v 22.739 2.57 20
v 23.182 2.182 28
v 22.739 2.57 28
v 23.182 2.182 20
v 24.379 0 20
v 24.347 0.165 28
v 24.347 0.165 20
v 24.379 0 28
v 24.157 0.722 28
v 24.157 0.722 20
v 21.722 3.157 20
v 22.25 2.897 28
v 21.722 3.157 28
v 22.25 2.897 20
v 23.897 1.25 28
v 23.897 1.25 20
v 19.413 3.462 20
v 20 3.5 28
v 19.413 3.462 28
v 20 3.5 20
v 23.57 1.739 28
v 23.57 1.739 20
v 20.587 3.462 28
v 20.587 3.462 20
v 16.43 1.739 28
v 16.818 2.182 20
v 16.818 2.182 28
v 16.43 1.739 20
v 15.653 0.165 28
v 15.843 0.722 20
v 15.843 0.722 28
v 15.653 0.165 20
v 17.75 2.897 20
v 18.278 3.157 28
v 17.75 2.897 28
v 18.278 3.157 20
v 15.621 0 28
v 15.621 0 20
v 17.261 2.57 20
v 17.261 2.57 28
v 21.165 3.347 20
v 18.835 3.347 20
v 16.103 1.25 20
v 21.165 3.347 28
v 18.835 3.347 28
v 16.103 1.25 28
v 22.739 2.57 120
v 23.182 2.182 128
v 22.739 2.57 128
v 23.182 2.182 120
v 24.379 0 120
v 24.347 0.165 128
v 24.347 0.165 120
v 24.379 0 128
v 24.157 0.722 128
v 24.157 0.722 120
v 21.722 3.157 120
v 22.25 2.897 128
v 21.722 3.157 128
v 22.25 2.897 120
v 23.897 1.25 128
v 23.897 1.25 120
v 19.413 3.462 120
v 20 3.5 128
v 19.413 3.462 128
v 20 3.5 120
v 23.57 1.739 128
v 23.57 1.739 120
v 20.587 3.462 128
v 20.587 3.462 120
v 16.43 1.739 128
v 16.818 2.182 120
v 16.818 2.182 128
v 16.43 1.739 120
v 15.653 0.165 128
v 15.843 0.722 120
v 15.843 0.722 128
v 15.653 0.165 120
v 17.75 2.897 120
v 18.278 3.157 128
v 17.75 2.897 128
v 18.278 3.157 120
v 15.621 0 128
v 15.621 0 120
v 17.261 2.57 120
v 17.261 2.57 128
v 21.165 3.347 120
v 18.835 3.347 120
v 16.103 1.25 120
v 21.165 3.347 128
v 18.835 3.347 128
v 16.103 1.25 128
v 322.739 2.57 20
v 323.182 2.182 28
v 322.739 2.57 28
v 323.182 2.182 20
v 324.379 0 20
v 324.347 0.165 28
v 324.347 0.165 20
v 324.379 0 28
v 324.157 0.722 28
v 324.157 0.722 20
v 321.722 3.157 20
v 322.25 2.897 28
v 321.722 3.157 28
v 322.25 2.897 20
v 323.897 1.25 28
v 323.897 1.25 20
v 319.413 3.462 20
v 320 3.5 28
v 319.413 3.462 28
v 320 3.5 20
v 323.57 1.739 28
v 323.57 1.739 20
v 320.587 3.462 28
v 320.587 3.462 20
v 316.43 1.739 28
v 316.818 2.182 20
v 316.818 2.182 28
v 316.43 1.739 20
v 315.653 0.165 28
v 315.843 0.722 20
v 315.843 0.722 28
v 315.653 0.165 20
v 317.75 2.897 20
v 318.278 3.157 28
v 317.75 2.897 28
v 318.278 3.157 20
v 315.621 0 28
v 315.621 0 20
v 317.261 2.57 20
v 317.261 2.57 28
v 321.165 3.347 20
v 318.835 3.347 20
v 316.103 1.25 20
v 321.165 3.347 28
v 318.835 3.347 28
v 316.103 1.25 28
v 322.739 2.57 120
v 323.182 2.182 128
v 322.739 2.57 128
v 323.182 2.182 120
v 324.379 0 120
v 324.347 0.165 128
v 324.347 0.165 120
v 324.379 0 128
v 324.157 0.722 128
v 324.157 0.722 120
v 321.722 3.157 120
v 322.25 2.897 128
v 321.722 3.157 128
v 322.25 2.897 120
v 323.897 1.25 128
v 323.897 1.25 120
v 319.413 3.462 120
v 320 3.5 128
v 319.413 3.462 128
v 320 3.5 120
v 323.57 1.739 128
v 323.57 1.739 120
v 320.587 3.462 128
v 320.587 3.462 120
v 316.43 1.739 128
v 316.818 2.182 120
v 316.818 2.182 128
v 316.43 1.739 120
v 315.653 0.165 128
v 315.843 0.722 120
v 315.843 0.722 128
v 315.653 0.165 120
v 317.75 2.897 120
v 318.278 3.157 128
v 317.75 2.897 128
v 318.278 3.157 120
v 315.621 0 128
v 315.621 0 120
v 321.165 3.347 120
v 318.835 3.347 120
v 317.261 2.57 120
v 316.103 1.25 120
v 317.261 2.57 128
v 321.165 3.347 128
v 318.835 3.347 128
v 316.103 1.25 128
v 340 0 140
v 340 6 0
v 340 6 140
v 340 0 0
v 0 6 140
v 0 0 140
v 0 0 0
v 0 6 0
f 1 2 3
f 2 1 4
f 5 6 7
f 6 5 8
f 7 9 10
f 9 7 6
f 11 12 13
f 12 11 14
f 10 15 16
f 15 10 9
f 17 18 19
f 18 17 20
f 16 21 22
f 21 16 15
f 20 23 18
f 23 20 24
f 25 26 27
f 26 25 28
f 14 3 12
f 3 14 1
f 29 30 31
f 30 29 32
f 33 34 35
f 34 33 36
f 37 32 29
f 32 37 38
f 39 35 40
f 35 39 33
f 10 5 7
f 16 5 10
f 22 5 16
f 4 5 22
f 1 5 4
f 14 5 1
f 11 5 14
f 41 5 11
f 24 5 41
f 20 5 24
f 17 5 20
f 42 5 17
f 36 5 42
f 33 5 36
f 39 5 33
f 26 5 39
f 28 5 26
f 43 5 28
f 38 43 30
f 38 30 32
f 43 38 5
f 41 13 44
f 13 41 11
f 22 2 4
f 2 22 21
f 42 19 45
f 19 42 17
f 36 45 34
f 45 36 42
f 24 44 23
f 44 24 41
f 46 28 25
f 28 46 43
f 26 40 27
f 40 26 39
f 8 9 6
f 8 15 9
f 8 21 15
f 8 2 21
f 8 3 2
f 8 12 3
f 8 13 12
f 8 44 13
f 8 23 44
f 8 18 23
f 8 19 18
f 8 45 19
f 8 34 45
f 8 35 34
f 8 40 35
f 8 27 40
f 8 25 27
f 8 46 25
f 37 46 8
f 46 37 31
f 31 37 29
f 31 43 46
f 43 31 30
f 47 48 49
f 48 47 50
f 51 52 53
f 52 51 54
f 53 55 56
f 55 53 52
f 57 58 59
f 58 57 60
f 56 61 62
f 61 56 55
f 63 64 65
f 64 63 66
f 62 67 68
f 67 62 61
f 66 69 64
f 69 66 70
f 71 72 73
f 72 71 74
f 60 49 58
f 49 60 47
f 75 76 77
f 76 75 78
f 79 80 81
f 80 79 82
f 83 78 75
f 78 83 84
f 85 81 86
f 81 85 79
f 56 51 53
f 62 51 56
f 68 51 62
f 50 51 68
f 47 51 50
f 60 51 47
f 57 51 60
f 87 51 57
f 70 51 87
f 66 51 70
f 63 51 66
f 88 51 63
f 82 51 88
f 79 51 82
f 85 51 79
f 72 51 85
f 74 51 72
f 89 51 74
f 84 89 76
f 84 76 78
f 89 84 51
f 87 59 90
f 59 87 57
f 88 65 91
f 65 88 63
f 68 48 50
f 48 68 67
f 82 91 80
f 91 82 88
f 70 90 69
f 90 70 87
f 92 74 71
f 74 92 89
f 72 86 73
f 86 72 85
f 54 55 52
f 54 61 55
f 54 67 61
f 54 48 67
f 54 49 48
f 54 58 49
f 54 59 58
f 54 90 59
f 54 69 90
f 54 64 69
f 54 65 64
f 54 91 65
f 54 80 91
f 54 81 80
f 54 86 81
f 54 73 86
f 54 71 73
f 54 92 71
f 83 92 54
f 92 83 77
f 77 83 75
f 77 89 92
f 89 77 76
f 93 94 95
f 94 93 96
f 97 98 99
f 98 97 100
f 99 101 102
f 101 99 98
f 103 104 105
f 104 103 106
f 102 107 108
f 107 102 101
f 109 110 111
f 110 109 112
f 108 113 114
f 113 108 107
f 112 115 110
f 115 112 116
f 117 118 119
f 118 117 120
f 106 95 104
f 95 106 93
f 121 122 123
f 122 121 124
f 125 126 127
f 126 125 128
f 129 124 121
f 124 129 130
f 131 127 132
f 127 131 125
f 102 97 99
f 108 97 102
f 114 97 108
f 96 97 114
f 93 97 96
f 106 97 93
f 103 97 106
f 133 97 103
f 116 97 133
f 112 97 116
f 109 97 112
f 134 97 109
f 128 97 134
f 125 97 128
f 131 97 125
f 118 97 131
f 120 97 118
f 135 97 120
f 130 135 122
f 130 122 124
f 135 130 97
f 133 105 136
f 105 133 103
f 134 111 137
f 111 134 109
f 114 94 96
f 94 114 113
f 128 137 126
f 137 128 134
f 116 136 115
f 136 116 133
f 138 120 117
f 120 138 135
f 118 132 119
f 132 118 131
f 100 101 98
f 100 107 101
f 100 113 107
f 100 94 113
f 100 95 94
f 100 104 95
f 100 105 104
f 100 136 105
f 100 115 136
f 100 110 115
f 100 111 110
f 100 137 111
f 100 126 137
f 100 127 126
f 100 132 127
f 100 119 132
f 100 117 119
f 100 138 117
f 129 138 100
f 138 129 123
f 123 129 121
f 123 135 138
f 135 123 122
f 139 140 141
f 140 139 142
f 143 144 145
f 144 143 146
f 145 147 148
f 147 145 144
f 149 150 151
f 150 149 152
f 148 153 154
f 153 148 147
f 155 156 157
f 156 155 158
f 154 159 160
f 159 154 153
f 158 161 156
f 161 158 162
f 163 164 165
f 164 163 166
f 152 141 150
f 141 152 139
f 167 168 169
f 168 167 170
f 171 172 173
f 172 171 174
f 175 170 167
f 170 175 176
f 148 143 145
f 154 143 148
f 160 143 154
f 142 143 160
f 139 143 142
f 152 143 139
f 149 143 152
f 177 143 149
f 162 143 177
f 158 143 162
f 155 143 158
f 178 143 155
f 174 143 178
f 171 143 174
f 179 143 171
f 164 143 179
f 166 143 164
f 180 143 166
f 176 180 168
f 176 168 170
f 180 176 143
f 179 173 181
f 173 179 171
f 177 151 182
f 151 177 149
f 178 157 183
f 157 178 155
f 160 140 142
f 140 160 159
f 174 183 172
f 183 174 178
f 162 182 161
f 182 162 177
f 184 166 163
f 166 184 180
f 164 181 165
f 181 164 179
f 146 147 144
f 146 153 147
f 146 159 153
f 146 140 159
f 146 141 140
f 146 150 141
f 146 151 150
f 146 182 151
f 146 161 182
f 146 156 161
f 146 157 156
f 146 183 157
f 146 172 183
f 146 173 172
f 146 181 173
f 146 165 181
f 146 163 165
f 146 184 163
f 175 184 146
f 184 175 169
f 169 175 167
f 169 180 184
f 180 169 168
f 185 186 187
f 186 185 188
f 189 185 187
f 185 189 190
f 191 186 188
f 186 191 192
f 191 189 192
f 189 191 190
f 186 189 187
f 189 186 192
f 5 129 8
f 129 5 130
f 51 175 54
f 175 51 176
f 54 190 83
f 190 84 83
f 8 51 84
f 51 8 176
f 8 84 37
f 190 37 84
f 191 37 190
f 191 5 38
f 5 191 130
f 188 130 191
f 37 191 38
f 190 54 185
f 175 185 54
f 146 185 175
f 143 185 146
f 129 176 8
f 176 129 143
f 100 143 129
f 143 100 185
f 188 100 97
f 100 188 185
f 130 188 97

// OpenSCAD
// perch_bracket.scad
// ——————————————————————————————————————————————————
// Welds to the BMW E21 subframe rails, captures the mount arm
// OUTPUT:  plate with two M8 holes at the chosen spacing
// ——————————————————————————————————————————————————

/* ====== USER PARAMETERS ====== */
// center‐to‐center spacing of the factory E21 subframe perches [X, Y] (mm)
perch_spacing = [300, 100];     
// bolt hole diameter (clearance for M8) (mm)
perch_hole_dia = 9;             
// perch plate thickness (mm)
perch_thk     = 6;              
// extra margin around holes (mm)
perch_margin  = 20;             

/* ====== DERIVED SIZES ====== */
perch_size = [
  perch_spacing[0] + perch_margin*2,
  perch_spacing[1] + perch_margin*2
];

/* ====== MODULE ====== */
module perch_bracket() {
  difference() {
    // subframe‐side plate
    cube([ perch_size[0], perch_thk, perch_size[1] ], center=false);
    // bolt holes
    for (x_off = [ perch_margin, perch_margin + perch_spacing[0] ])
      for (y_off = [ perch_margin, perch_margin + perch_spacing[1] ])
        translate([ x_off, -1, y_off ])
          cylinder(h=perch_thk+2, r=perch_hole_dia/2, $fn=48);
  }
}

/* ====== RENDER ====== */
perch_bracket();
